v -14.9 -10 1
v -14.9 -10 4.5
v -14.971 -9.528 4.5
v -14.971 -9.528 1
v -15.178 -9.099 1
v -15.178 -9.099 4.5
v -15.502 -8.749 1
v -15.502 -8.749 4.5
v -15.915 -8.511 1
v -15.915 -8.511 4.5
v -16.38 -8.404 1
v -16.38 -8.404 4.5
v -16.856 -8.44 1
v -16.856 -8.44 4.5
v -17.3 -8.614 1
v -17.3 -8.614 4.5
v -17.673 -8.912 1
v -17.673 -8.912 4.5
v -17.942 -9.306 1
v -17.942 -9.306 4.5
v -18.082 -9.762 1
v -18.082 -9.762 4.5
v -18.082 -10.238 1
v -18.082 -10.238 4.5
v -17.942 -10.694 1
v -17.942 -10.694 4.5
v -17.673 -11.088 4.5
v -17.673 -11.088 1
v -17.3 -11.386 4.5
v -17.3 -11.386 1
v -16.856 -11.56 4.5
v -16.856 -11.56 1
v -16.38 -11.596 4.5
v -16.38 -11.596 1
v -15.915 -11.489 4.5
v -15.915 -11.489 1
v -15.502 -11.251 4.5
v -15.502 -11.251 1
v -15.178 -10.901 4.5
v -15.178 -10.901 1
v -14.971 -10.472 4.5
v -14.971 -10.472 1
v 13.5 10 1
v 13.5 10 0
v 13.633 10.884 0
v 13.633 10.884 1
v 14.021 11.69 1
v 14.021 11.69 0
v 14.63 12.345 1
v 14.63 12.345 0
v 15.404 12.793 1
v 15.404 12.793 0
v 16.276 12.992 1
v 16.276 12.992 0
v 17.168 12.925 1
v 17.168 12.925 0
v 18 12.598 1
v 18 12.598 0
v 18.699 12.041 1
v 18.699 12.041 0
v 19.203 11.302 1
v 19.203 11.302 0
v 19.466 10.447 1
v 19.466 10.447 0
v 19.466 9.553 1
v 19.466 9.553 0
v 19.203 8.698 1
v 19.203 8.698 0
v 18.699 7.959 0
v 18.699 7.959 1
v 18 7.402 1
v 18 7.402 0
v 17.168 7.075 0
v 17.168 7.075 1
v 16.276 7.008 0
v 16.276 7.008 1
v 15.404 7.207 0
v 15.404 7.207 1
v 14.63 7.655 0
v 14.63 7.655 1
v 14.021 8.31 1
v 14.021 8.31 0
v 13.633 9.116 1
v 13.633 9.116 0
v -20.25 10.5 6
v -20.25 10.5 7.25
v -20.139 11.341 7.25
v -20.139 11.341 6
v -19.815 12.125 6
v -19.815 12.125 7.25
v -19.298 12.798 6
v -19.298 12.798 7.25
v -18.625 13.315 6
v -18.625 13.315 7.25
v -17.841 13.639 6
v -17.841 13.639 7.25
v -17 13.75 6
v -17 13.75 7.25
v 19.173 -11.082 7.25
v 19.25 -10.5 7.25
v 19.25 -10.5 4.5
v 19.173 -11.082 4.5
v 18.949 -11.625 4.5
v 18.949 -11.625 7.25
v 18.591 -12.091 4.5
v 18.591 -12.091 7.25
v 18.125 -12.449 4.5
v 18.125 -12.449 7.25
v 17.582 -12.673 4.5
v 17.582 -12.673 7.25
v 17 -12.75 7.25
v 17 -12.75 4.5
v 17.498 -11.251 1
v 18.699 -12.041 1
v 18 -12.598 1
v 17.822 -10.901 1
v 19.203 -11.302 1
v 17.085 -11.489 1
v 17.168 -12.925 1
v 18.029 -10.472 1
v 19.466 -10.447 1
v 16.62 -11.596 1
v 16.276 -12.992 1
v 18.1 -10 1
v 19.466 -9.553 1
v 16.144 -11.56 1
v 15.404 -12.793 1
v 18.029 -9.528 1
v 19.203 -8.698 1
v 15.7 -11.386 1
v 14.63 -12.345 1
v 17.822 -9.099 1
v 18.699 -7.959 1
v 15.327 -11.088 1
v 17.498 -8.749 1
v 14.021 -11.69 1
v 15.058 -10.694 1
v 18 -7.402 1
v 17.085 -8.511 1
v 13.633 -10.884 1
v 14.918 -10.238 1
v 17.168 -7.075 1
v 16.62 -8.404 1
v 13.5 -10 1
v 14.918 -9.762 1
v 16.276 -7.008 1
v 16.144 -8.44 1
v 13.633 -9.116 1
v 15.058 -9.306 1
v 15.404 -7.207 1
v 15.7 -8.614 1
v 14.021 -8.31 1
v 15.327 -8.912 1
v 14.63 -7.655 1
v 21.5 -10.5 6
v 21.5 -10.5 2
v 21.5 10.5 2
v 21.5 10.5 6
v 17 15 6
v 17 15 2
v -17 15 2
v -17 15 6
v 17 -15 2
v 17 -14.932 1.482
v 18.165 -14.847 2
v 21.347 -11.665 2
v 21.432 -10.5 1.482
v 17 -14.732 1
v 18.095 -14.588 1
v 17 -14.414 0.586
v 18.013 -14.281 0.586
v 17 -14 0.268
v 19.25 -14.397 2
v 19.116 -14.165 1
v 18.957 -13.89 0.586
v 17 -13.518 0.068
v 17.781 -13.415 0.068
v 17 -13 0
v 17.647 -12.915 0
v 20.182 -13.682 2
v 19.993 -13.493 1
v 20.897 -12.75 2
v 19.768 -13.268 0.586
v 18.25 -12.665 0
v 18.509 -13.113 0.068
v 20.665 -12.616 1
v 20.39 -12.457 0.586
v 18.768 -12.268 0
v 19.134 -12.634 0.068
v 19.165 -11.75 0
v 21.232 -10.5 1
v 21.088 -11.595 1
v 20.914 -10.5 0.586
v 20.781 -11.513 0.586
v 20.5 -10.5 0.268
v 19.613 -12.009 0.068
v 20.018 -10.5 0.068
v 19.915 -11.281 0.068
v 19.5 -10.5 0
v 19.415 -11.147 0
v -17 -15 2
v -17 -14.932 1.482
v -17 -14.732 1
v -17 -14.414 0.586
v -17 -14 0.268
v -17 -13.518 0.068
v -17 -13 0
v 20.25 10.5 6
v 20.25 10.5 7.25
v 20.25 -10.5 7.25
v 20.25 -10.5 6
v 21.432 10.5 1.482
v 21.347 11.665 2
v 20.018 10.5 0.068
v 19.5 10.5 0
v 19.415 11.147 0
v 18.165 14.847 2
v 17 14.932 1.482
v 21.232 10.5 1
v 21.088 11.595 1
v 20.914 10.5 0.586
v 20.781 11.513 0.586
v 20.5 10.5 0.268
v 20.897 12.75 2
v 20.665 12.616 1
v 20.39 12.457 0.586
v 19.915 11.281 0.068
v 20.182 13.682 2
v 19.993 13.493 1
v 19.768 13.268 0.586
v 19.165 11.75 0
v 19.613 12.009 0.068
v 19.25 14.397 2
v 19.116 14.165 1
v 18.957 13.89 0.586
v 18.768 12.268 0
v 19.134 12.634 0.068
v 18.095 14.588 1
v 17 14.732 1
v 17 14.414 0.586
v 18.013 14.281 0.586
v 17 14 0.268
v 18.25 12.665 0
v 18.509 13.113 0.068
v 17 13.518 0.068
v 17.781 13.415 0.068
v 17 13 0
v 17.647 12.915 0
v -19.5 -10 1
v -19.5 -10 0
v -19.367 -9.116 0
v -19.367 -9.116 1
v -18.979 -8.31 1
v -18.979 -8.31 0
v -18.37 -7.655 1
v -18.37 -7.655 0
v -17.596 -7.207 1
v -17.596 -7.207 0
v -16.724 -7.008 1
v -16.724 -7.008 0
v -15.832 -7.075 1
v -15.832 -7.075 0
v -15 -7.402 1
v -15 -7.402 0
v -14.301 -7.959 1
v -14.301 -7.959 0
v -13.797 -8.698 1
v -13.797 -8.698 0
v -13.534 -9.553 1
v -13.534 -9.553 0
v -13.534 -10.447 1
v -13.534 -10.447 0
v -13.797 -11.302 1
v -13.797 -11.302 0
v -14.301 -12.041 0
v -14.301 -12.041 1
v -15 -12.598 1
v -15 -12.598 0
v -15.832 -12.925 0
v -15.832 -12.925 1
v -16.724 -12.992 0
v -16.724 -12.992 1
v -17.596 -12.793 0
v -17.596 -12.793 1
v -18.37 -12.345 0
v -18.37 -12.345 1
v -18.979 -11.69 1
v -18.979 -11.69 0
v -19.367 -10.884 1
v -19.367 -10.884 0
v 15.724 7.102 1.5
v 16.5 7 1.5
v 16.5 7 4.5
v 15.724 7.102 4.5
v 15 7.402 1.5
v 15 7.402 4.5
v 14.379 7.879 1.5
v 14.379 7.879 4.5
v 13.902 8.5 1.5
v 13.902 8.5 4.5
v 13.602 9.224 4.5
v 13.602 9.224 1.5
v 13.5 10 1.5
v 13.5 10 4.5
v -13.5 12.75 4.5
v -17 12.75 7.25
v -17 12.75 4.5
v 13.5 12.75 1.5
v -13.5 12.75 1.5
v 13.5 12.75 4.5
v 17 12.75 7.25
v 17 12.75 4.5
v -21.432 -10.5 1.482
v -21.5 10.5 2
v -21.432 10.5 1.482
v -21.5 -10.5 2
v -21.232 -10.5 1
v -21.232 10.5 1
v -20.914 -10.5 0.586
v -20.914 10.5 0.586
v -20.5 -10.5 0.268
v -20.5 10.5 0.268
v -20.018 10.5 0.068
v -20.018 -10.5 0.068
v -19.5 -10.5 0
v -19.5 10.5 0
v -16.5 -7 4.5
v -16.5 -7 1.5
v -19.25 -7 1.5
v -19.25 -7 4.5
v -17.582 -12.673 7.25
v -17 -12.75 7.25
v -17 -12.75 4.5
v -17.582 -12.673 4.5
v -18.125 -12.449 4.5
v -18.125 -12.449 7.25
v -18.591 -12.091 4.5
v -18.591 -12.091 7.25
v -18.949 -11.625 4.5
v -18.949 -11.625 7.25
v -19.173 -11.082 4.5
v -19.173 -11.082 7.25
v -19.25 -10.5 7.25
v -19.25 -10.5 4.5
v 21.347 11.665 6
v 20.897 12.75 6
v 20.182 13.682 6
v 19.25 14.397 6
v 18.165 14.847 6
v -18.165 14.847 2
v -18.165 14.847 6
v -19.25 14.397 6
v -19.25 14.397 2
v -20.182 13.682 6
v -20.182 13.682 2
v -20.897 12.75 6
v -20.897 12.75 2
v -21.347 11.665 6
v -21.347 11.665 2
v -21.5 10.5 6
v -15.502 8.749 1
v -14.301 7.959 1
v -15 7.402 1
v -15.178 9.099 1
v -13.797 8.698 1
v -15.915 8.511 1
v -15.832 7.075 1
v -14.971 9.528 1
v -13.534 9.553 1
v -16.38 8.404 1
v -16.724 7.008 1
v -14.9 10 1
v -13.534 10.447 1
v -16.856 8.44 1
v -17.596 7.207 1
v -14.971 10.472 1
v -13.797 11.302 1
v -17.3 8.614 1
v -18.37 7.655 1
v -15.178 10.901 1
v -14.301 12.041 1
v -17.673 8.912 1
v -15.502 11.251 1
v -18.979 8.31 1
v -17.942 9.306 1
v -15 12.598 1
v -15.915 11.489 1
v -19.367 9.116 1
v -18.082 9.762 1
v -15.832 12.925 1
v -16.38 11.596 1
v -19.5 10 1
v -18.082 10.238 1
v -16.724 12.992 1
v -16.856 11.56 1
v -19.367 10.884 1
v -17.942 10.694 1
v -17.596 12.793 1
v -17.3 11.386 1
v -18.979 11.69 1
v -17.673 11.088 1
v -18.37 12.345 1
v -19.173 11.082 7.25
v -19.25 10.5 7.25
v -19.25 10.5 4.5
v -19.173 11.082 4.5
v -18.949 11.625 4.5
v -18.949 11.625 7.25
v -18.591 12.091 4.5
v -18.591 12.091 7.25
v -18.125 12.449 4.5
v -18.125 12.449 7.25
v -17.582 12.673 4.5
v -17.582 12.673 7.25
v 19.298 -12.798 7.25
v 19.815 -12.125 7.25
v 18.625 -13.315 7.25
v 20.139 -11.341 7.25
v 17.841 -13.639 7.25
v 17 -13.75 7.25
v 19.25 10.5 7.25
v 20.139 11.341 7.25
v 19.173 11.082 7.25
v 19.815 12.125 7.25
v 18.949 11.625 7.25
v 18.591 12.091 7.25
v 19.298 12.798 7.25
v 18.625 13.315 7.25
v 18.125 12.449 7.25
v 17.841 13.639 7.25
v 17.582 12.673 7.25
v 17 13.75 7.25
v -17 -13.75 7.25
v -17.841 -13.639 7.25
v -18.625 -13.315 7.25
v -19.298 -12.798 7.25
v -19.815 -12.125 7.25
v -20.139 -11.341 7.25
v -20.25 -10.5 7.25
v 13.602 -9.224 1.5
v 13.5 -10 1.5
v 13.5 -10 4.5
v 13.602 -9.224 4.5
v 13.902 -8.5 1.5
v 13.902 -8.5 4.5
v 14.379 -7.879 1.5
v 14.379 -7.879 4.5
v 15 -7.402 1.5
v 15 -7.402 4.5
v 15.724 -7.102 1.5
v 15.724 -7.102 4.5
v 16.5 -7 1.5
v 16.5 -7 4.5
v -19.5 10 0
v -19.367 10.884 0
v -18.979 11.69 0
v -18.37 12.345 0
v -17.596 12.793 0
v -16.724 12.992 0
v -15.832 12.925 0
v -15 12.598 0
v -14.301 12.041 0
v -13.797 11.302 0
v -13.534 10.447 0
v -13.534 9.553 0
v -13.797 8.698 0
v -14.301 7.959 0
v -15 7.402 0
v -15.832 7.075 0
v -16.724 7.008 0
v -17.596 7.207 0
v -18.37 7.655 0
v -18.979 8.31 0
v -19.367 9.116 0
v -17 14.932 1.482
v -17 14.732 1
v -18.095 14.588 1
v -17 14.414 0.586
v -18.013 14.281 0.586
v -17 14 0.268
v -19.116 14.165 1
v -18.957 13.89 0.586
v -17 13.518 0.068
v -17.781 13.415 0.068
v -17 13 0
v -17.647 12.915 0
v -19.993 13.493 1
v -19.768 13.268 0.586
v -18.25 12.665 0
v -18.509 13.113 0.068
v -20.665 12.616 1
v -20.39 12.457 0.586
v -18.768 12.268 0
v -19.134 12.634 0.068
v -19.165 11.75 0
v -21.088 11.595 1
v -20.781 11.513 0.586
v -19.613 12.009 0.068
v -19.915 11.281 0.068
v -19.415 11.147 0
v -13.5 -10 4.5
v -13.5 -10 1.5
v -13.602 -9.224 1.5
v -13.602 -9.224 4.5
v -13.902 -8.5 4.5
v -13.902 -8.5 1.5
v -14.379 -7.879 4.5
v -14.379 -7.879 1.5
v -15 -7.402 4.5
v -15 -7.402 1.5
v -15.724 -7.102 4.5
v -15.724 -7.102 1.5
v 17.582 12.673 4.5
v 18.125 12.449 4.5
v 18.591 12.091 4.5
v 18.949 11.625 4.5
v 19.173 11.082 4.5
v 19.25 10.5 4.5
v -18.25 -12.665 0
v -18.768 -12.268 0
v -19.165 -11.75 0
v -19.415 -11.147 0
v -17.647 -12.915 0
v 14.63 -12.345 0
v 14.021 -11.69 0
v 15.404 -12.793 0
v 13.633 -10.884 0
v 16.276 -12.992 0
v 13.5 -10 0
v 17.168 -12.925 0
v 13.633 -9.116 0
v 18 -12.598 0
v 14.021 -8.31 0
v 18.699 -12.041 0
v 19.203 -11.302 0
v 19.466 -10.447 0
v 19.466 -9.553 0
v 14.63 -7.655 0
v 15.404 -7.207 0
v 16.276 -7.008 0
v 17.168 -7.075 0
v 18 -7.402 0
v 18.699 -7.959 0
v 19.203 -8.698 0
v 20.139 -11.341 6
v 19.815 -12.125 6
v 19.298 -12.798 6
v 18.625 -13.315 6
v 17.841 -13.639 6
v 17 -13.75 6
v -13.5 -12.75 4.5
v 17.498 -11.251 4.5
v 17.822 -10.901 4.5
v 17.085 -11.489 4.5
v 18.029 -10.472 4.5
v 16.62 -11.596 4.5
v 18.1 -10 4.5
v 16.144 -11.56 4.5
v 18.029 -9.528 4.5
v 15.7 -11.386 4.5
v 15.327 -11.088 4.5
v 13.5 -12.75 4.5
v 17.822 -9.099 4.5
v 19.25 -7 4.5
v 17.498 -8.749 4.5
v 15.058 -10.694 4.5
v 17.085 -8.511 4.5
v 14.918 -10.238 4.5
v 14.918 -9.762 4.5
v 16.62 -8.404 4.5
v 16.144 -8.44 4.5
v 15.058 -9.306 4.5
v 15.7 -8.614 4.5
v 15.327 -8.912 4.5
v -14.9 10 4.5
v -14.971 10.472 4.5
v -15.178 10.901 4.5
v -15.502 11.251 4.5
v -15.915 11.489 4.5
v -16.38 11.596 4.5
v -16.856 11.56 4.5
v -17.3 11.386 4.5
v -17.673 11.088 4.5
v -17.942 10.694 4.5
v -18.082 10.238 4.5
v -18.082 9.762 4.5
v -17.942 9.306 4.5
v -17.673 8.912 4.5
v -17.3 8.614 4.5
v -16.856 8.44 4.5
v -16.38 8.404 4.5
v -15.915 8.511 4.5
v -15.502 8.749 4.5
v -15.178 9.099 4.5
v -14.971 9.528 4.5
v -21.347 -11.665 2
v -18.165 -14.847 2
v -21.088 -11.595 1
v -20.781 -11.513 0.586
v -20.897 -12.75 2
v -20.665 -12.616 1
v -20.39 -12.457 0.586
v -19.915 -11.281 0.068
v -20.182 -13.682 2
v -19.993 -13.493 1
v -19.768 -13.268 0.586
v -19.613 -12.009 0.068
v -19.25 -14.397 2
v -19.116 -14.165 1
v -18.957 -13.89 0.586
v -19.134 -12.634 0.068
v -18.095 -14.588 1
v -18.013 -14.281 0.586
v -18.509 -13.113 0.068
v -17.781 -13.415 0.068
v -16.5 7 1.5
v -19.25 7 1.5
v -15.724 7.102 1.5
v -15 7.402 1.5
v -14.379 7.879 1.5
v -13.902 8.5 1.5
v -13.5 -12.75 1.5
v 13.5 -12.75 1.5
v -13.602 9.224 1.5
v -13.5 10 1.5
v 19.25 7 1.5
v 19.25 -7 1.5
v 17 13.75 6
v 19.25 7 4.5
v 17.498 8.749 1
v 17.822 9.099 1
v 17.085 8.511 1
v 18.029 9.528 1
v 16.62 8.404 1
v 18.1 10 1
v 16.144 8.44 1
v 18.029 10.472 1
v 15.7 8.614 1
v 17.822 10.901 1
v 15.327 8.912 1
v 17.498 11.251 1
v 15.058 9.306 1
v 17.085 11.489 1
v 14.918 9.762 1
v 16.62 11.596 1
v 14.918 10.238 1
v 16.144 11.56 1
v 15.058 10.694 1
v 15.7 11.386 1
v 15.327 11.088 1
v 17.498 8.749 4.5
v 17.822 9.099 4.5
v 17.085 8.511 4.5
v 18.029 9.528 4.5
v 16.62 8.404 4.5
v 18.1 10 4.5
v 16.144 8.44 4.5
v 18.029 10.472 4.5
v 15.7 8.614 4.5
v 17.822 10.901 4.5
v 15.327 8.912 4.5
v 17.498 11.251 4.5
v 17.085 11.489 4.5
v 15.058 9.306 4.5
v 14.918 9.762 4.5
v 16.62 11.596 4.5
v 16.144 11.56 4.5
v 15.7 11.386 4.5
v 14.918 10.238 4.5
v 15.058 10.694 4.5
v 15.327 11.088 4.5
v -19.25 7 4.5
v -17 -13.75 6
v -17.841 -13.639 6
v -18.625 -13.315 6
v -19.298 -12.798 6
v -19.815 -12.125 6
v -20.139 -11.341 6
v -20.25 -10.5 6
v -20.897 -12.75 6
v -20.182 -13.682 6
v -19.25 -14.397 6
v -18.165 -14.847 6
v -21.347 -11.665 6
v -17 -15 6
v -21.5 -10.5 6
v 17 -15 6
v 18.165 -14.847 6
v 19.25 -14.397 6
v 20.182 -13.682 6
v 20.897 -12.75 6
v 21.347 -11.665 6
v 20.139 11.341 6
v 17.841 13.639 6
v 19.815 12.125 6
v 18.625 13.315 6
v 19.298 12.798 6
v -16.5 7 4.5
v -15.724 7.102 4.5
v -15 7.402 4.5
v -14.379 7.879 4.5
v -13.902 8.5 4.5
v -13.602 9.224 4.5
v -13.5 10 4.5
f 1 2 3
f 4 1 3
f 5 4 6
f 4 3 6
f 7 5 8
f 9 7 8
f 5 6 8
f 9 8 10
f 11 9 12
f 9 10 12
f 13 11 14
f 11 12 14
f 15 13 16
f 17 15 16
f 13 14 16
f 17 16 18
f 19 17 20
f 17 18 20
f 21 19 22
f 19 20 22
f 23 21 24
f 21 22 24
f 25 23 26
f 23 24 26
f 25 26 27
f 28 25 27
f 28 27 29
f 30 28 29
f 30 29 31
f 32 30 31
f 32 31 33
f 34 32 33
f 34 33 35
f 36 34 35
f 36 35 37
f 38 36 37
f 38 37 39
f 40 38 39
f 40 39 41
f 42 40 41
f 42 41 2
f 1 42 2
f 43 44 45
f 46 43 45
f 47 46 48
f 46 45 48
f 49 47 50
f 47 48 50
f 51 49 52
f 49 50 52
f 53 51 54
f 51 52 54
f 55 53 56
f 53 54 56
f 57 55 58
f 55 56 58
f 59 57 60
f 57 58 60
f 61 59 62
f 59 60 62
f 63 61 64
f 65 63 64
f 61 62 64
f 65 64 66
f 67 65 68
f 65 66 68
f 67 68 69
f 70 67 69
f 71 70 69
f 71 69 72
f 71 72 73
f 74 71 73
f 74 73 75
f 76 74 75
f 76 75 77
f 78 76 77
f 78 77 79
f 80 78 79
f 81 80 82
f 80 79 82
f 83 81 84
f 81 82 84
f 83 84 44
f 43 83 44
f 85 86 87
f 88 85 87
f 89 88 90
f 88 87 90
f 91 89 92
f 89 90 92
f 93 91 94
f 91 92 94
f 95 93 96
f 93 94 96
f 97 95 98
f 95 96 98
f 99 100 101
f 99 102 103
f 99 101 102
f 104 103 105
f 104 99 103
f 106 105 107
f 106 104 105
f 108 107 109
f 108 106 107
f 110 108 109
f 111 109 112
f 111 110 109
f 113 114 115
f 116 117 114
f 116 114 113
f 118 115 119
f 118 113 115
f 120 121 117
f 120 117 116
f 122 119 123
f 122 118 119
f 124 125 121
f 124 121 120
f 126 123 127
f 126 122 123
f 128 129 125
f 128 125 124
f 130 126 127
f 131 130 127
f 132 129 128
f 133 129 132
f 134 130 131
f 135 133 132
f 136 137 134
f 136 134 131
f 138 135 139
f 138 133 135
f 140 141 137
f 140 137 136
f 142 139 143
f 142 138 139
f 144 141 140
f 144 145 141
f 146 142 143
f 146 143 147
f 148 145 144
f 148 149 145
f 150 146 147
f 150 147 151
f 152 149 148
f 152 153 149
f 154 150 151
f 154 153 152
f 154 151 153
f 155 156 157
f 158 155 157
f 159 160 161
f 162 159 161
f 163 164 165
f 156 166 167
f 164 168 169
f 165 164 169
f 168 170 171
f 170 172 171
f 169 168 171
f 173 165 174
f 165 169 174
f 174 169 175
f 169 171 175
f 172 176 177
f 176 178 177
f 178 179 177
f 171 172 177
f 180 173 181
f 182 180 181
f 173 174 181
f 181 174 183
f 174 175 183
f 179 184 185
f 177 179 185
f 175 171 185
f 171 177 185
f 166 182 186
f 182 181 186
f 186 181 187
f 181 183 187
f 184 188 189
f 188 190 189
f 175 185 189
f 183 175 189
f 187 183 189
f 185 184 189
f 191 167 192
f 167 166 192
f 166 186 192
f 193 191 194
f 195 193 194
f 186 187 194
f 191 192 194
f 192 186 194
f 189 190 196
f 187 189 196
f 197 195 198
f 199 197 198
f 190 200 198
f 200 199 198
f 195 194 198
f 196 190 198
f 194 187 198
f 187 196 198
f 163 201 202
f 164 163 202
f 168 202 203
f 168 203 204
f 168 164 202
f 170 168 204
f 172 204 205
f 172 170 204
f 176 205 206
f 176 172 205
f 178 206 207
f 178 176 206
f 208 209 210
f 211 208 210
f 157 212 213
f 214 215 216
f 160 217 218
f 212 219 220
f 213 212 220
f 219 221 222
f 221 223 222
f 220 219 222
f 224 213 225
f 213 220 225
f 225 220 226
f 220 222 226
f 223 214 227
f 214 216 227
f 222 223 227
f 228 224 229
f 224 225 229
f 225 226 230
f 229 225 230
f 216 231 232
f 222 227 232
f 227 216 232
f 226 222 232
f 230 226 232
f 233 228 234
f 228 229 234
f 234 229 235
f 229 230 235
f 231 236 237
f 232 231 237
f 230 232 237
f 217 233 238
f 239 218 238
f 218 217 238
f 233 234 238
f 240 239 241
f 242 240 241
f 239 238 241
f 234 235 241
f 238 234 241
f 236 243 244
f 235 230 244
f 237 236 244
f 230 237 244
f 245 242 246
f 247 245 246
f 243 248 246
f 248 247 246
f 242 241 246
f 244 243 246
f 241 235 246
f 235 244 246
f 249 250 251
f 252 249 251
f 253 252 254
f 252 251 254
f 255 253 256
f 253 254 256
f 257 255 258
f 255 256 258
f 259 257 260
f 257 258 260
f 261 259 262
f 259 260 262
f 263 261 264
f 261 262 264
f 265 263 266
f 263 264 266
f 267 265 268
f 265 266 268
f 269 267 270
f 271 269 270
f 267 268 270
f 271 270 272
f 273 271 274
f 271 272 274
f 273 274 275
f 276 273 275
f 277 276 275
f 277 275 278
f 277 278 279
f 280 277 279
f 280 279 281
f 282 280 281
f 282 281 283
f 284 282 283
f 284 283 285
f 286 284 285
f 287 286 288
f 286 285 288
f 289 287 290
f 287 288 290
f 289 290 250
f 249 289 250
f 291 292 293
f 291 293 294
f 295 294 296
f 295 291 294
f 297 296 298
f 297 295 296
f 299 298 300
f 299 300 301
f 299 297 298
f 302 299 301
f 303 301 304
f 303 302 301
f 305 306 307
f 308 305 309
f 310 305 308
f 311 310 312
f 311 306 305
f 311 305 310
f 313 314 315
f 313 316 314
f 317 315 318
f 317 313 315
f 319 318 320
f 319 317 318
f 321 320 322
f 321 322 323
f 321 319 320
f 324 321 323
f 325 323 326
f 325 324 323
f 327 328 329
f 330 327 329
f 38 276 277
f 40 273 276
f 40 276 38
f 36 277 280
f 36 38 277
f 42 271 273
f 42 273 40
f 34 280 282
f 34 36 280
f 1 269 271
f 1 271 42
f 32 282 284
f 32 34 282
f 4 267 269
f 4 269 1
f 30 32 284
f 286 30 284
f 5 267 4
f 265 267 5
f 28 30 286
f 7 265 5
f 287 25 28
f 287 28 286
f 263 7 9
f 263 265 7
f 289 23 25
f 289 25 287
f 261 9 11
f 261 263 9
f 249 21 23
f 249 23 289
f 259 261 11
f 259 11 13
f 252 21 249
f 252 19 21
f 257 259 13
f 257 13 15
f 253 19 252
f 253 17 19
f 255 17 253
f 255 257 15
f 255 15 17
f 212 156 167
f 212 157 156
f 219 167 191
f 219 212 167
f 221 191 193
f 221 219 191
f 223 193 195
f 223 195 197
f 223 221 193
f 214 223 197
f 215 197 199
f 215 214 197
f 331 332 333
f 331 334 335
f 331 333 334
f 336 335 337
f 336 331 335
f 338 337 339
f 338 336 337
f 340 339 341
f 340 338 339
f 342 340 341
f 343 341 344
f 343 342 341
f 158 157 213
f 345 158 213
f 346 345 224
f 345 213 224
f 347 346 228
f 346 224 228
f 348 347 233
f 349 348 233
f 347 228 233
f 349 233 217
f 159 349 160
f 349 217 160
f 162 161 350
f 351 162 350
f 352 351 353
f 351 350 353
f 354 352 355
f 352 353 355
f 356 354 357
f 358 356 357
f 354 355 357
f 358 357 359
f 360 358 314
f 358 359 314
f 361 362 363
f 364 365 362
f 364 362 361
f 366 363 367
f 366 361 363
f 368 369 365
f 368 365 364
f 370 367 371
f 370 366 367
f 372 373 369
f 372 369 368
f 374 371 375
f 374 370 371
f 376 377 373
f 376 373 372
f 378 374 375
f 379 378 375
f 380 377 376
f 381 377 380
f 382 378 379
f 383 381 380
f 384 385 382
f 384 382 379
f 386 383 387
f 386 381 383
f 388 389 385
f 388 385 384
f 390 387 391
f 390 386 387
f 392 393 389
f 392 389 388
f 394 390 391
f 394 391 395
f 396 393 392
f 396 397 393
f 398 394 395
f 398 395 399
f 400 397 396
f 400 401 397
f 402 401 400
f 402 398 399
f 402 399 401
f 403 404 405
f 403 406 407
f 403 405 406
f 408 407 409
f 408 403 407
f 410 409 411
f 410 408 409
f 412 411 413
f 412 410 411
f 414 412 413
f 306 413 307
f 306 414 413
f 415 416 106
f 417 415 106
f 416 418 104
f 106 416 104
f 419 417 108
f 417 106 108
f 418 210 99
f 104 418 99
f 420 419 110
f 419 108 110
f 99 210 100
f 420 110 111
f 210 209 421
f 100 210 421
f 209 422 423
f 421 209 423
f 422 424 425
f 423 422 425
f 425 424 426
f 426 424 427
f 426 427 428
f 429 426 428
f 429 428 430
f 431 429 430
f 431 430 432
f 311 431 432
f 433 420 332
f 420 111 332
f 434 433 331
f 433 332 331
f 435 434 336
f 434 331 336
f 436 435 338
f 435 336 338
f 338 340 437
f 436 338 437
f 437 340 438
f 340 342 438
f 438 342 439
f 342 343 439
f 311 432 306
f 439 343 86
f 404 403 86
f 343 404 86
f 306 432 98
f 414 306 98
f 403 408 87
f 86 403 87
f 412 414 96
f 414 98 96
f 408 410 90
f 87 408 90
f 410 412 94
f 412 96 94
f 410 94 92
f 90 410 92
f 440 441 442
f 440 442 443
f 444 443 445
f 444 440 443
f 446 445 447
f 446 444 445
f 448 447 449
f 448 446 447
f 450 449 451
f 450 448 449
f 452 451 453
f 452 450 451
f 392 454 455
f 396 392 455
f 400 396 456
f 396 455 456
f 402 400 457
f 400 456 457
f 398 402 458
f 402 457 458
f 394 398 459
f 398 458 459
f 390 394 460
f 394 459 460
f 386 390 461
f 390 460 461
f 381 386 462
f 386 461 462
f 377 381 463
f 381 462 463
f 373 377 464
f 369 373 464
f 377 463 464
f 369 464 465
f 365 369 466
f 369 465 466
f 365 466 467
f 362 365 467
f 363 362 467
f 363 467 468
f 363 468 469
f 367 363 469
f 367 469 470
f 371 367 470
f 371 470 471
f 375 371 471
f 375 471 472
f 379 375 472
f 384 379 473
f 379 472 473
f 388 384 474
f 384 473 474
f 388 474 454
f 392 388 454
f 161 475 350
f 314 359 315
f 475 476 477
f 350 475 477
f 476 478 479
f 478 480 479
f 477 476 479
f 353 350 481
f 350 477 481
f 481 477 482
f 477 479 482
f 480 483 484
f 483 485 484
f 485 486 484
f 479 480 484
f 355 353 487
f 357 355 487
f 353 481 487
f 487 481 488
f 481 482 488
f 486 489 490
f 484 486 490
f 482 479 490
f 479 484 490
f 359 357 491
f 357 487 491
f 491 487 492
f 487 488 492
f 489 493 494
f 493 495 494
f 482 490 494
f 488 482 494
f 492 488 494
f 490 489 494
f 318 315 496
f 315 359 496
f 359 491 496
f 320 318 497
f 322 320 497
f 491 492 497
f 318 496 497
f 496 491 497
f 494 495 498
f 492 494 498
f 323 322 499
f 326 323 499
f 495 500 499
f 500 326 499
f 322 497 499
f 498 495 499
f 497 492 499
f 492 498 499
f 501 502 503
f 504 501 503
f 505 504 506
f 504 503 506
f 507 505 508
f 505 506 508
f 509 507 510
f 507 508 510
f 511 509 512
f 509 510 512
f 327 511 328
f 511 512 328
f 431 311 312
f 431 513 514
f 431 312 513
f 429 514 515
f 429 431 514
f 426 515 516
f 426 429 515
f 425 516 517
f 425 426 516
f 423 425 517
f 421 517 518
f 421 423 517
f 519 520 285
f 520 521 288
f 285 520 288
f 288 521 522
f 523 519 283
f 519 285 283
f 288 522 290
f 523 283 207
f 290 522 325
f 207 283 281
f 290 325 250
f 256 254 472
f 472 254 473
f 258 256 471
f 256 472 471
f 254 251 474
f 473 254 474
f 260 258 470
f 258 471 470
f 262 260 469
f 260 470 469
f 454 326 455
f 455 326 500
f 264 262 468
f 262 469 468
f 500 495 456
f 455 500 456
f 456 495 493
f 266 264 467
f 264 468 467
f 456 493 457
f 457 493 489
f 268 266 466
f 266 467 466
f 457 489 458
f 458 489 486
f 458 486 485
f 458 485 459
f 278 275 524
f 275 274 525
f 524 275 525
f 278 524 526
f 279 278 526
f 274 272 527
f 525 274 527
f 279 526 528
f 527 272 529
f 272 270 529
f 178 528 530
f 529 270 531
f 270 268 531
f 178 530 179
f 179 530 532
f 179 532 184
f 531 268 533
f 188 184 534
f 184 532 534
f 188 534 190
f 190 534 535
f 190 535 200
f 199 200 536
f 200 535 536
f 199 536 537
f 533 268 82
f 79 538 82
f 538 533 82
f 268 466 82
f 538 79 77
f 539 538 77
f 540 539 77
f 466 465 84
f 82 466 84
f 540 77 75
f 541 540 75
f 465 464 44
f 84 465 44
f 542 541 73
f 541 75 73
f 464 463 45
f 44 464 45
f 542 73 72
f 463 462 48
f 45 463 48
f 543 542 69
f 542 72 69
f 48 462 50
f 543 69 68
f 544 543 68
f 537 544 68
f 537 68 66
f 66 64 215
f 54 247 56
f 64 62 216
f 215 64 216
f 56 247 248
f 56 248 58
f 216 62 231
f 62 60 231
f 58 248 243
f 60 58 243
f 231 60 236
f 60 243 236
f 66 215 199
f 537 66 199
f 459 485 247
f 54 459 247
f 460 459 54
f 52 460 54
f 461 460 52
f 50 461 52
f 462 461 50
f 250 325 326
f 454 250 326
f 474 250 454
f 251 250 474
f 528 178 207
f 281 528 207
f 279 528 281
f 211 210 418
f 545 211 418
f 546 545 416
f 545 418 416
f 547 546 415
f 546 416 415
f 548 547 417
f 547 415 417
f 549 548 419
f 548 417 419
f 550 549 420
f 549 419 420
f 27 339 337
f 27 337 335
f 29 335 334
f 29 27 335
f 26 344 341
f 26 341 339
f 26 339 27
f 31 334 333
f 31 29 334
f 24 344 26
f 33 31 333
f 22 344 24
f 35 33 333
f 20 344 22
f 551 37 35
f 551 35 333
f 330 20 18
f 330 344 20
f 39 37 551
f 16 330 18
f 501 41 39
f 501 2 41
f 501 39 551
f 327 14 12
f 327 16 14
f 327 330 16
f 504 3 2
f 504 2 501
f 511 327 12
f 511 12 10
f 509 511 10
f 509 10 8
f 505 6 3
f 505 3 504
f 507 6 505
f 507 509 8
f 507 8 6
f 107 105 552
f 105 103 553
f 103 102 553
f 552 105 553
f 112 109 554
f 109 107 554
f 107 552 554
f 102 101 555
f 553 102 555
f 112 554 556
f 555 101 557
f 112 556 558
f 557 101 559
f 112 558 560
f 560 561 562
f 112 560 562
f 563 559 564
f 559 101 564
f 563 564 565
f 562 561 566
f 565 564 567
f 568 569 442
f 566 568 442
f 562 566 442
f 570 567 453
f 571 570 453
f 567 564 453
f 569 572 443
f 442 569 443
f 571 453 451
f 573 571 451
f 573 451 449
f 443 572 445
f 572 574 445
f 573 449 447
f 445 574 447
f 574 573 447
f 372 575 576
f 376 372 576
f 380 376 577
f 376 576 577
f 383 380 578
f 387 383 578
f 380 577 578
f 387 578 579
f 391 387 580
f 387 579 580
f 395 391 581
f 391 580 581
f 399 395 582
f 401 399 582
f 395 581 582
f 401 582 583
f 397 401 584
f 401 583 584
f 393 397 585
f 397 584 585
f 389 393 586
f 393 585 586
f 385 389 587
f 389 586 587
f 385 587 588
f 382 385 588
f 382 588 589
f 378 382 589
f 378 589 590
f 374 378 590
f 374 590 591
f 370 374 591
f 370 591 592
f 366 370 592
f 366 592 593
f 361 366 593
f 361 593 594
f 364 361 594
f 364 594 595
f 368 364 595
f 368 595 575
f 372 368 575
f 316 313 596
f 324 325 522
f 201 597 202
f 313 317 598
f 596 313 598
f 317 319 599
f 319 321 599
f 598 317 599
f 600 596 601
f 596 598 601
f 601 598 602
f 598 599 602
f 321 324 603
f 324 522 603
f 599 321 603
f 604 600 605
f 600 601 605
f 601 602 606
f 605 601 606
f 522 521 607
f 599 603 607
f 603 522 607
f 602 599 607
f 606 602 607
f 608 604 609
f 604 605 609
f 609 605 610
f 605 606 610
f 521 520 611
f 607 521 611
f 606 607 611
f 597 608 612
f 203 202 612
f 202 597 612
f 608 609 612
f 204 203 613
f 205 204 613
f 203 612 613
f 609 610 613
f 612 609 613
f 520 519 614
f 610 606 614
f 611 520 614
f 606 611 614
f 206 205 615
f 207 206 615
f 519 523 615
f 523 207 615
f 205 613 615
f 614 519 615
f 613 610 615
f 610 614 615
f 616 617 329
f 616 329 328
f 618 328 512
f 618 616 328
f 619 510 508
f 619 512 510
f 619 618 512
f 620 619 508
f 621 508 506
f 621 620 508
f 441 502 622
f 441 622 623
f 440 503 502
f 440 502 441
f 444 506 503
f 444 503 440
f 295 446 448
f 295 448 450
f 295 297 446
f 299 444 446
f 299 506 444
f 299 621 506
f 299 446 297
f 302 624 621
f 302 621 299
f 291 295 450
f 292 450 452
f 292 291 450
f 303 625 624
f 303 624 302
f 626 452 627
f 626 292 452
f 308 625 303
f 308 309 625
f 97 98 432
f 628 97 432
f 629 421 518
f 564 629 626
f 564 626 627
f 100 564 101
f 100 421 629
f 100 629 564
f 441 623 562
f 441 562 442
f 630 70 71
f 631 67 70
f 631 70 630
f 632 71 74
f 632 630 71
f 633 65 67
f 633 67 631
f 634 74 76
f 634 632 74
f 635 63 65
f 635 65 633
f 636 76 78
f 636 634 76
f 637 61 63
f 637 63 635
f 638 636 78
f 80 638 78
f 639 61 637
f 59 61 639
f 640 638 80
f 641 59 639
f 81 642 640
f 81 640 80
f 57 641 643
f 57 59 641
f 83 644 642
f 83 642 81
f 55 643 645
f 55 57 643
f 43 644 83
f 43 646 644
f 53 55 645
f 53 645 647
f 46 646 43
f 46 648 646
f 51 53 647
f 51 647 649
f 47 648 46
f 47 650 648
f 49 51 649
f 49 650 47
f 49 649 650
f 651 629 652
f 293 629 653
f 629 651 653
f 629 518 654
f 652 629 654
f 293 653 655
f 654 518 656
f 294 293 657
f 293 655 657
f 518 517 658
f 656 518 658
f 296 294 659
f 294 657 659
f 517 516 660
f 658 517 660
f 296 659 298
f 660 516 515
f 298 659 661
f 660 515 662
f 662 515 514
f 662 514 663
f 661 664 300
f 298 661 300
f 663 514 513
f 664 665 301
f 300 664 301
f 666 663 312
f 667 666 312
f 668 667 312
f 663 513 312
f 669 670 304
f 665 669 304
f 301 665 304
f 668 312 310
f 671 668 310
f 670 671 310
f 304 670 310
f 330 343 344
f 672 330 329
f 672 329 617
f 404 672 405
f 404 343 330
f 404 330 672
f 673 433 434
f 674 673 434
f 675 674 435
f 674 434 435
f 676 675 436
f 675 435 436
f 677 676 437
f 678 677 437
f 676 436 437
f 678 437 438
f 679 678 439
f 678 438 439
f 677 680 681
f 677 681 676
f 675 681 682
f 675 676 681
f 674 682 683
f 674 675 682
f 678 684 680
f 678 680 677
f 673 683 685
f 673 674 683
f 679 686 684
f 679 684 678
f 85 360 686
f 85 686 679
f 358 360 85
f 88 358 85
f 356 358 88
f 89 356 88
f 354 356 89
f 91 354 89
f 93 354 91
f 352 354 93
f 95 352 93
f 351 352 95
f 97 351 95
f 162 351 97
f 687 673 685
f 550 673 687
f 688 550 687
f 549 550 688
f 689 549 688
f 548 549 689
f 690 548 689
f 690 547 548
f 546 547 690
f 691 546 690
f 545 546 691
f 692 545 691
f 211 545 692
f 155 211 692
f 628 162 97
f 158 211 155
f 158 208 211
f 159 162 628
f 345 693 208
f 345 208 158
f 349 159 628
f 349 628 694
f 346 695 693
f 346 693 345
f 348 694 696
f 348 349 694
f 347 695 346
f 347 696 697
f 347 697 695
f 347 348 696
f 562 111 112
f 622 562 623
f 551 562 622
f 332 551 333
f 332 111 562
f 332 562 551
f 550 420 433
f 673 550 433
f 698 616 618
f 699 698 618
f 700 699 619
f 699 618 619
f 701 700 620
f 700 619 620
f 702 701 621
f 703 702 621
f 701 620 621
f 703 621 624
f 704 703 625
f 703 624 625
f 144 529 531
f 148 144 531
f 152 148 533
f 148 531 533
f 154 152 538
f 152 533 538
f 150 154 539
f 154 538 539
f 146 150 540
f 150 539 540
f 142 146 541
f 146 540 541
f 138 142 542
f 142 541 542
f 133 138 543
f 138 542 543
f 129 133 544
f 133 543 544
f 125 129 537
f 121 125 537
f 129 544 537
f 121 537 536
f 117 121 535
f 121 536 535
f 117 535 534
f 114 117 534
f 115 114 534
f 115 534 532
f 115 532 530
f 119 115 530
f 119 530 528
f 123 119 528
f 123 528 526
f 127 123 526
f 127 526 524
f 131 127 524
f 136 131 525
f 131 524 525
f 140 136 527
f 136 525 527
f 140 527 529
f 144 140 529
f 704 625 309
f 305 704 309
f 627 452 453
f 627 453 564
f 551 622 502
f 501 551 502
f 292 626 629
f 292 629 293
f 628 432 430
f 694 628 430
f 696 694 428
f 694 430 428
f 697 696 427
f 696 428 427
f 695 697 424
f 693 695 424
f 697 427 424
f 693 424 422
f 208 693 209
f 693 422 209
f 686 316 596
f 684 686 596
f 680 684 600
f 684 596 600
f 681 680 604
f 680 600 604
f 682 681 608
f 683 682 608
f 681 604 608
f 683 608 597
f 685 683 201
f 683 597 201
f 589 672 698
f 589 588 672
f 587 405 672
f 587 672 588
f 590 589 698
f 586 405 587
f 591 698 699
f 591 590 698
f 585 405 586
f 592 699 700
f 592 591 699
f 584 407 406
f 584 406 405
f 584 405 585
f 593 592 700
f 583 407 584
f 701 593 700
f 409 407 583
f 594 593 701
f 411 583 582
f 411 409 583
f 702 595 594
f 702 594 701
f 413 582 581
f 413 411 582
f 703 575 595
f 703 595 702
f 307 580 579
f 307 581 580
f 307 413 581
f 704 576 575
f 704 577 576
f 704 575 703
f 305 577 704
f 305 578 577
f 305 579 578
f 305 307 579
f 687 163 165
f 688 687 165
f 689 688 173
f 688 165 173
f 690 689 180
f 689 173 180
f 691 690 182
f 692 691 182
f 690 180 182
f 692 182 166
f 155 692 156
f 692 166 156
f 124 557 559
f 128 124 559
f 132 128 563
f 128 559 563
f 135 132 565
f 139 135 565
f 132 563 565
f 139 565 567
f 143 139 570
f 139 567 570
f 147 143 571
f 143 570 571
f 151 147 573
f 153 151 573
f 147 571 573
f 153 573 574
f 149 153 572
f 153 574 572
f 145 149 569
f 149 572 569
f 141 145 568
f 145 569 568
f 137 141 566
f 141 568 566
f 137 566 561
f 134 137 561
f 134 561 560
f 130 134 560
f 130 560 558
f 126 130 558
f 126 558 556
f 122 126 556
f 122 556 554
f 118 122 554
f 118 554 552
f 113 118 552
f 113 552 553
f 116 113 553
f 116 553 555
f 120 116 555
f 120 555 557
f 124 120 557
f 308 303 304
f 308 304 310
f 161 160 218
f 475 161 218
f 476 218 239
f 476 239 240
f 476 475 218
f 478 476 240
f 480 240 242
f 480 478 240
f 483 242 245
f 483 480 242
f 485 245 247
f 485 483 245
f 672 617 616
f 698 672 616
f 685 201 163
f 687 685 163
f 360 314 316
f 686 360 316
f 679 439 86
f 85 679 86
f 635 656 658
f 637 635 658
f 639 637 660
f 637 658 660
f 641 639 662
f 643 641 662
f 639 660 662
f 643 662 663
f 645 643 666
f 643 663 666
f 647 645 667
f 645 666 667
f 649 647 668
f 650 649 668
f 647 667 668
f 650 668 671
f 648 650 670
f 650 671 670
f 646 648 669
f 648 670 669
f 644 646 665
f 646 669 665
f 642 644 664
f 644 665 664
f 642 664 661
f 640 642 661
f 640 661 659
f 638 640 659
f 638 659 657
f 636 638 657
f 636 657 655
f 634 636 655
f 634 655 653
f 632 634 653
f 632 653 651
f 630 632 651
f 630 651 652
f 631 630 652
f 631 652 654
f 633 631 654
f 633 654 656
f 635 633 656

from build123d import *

# Parameters (mm, degrees)
EXTRUDE_1_DEPTH     = 6
CUT_EXTRUDE_1_DEPTH = 4.5
EXTRUDE_4_DEPTH     = 3
SKETCH_4_R          = 1.6
CUT_EXTRUDE_2_DEPTH = 6
EXTRUDE_START       = 1.25
EXTRUDE_5_DEPTH     = 1.25
SKETCH_6_R          = 3
CUT_EXTRUDE_3_DEPTH = 1
FILLET_1_R          = 2


with BuildPart() as part:
    # Эскиз1 → Бобышка-Вытянуть1 (new body)
    with BuildSketch(Plane.XY):
        with BuildLine():
            Line((-17, -15), (17, -15))
            ThreePointArc((17, -15), (20.181980515, -13.681980515), (21.5, -10.5))
            Line((21.5, -10.5), (21.5, 10.5))
            ThreePointArc((21.5, 10.5), (20.181980515, 13.681980515), (17, 15))
            Line((17, 15), (-17, 15))
            ThreePointArc((-17, 15), (-20.181980515, 13.681980515), (-21.5, 10.5))
            Line((-21.5, 10.5), (-21.5, -10.5))
            ThreePointArc((-21.5, -10.5), (-20.181980515, -13.681980515), (-17, -15))
        make_face()
    extrude(amount=EXTRUDE_1_DEPTH)

    # Эскиз2 → Вырез-Вытянуть1 (cut)
    with BuildSketch(Plane.XY.offset(6)):
        with BuildLine():
            Line((-17, -12.75), (17, -12.75))
            ThreePointArc((17, -12.75), (18.590990258, -12.090990258), (19.25, -10.5))
            Line((19.25, -10.5), (19.25, 10.5))
            ThreePointArc((19.25, 10.5), (18.590990258, 12.090990258), (17, 12.75))
            Line((17, 12.75), (-17, 12.75))
            ThreePointArc((-17, 12.75), (-18.590990258, 12.090990258), (-19.25, 10.5))
            Line((-19.25, 10.5), (-19.25, -10.5))
            ThreePointArc((-19.25, -10.5), (-18.590990258, -12.090990258), (-17, -12.75))
        make_face()
    extrude(amount=-CUT_EXTRUDE_1_DEPTH, mode=Mode.SUBTRACT)

    # Эскиз3 → Бобышка-Вытянуть4 (add)
    with BuildSketch(Plane.XY.offset(1.5)):
        with BuildLine():
            Line((-13.5, 10), (-13.5, 13))
            Line((-13.5, 13), (-19.5, 13))
            Line((-19.5, 13), (-19.5, 7))
            Line((-19.5, 7), (-16.5, 7))
            ThreePointArc((-16.5, 7), (-14.378679656, 7.878679656), (-13.5, 10))
        make_face()
        with BuildLine():
            Line((-16.5, -7), (-19.5, -7))
            Line((-19.5, -7), (-19.5, -13))
            Line((-19.5, -13), (-13.5, -13))
            Line((-13.5, -13), (-13.5, -10))
            ThreePointArc((-13.5, -10), (-14.378679656, -7.878679656), (-16.5, -7))
        make_face()
        with BuildLine():
            Line((16.5, -7), (19.5, -7))
            Line((19.5, -7), (19.5, -13))
            Line((19.5, -13), (13.5, -13))
            Line((13.5, -13), (13.5, -10))
            ThreePointArc((13.5, -10), (14.378679656, -7.878679656), (16.5, -7))
        make_face()
        with BuildLine():
            Line((13.5, 10), (13.5, 13))
            Line((13.5, 13), (19.5, 13))
            Line((19.5, 13), (19.5, 7))
            Line((19.5, 7), (16.5, 7))
            ThreePointArc((16.5, 7), (14.378679656, 7.878679656), (13.5, 10))
        make_face()
    extrude(amount=EXTRUDE_4_DEPTH)

    # Эскиз4 → Вырез-Вытянуть2 (cut)
    with BuildSketch(Plane.XY.offset(4.5)):
        with Locations((16.5, -10)):
            Circle(SKETCH_4_R)
        with Locations((-16.5, -10)):
            Circle(SKETCH_4_R)
        with Locations((-16.5, 10)):
            Circle(SKETCH_4_R)
        with Locations((16.5, 10)):
            Circle(SKETCH_4_R)
    extrude(amount=-CUT_EXTRUDE_2_DEPTH, mode=Mode.SUBTRACT)

    # Эскиз5 → Бобышка-Вытянуть5 (add)
    with BuildSketch(Plane.XY.offset(6).offset(EXTRUDE_START)):
        with BuildLine():
            Line((17, -13.75), (-17, -13.75))
            ThreePointArc((-17, -13.75), (-19.298097039, -12.798097039), (-20.25, -10.5))
            Line((-20.25, -10.5), (-20.25, 10.5))
            ThreePointArc((-20.25, 10.5), (-19.298097039, 12.798097039), (-17, 13.75))
            Line((-17, 13.75), (17, 13.75))
            ThreePointArc((17, 13.75), (19.298097039, 12.798097039), (20.25, 10.5))
            Line((20.25, 10.5), (20.25, -10.5))
            ThreePointArc((20.25, -10.5), (19.298097039, -12.798097039), (17, -13.75))
        make_face()
        with BuildLine():
            Line((17, -12.75), (-17, -12.75))
            ThreePointArc((-17, -12.75), (-18.590990258, -12.090990258), (-19.25, -10.5))
            Line((-19.25, -10.5), (-19.25, 10.5))
            ThreePointArc((-19.25, 10.5), (-18.590990258, 12.090990258), (-17, 12.75))
            Line((-17, 12.75), (17, 12.75))
            ThreePointArc((17, 12.75), (18.590990258, 12.090990258), (19.25, 10.5))
            Line((19.25, 10.5), (19.25, -10.5))
            ThreePointArc((19.25, -10.5), (18.590990258, -12.090990258), (17, -12.75))
        make_face(mode=Mode.SUBTRACT)
    extrude(amount=-EXTRUDE_5_DEPTH)

    # Эскиз6 → Вырез-Вытянуть3 (cut)
    with BuildSketch(Plane(origin=(0, 0, 0), x_dir=(-1, 0, 0), z_dir=(0, 0, -1))):
        with Locations((16.5, -10)):
            Circle(SKETCH_6_R)
        with Locations((-16.5, -10)):
            Circle(SKETCH_6_R)
        with Locations((16.5, 10)):
            Circle(SKETCH_6_R)
        with Locations((-16.5, 10)):
            Circle(SKETCH_6_R)
    extrude(amount=-CUT_EXTRUDE_3_DEPTH, mode=Mode.SUBTRACT)

    # Скругление1
    fillet_1_edges = [part.edges().sort_by_distance(p)[0] for p in [
        (21.5, 0, 0),
        (20.181980515, -13.681980515, 0),
        (0, -15, 0),
        (-20.181980515, -13.681980515, 0),
        (-21.5, 0, 0),
        (-20.181980515, 13.681980515, 0),
        (0, 15, 0),
        (20.181980515, 13.681980515, 0),
    ]]
    fillet(fillet_1_edges, radius=FILLET_1_R - 0.0001)  # a hair under: the kernel refuses the full size


solid = part.part
